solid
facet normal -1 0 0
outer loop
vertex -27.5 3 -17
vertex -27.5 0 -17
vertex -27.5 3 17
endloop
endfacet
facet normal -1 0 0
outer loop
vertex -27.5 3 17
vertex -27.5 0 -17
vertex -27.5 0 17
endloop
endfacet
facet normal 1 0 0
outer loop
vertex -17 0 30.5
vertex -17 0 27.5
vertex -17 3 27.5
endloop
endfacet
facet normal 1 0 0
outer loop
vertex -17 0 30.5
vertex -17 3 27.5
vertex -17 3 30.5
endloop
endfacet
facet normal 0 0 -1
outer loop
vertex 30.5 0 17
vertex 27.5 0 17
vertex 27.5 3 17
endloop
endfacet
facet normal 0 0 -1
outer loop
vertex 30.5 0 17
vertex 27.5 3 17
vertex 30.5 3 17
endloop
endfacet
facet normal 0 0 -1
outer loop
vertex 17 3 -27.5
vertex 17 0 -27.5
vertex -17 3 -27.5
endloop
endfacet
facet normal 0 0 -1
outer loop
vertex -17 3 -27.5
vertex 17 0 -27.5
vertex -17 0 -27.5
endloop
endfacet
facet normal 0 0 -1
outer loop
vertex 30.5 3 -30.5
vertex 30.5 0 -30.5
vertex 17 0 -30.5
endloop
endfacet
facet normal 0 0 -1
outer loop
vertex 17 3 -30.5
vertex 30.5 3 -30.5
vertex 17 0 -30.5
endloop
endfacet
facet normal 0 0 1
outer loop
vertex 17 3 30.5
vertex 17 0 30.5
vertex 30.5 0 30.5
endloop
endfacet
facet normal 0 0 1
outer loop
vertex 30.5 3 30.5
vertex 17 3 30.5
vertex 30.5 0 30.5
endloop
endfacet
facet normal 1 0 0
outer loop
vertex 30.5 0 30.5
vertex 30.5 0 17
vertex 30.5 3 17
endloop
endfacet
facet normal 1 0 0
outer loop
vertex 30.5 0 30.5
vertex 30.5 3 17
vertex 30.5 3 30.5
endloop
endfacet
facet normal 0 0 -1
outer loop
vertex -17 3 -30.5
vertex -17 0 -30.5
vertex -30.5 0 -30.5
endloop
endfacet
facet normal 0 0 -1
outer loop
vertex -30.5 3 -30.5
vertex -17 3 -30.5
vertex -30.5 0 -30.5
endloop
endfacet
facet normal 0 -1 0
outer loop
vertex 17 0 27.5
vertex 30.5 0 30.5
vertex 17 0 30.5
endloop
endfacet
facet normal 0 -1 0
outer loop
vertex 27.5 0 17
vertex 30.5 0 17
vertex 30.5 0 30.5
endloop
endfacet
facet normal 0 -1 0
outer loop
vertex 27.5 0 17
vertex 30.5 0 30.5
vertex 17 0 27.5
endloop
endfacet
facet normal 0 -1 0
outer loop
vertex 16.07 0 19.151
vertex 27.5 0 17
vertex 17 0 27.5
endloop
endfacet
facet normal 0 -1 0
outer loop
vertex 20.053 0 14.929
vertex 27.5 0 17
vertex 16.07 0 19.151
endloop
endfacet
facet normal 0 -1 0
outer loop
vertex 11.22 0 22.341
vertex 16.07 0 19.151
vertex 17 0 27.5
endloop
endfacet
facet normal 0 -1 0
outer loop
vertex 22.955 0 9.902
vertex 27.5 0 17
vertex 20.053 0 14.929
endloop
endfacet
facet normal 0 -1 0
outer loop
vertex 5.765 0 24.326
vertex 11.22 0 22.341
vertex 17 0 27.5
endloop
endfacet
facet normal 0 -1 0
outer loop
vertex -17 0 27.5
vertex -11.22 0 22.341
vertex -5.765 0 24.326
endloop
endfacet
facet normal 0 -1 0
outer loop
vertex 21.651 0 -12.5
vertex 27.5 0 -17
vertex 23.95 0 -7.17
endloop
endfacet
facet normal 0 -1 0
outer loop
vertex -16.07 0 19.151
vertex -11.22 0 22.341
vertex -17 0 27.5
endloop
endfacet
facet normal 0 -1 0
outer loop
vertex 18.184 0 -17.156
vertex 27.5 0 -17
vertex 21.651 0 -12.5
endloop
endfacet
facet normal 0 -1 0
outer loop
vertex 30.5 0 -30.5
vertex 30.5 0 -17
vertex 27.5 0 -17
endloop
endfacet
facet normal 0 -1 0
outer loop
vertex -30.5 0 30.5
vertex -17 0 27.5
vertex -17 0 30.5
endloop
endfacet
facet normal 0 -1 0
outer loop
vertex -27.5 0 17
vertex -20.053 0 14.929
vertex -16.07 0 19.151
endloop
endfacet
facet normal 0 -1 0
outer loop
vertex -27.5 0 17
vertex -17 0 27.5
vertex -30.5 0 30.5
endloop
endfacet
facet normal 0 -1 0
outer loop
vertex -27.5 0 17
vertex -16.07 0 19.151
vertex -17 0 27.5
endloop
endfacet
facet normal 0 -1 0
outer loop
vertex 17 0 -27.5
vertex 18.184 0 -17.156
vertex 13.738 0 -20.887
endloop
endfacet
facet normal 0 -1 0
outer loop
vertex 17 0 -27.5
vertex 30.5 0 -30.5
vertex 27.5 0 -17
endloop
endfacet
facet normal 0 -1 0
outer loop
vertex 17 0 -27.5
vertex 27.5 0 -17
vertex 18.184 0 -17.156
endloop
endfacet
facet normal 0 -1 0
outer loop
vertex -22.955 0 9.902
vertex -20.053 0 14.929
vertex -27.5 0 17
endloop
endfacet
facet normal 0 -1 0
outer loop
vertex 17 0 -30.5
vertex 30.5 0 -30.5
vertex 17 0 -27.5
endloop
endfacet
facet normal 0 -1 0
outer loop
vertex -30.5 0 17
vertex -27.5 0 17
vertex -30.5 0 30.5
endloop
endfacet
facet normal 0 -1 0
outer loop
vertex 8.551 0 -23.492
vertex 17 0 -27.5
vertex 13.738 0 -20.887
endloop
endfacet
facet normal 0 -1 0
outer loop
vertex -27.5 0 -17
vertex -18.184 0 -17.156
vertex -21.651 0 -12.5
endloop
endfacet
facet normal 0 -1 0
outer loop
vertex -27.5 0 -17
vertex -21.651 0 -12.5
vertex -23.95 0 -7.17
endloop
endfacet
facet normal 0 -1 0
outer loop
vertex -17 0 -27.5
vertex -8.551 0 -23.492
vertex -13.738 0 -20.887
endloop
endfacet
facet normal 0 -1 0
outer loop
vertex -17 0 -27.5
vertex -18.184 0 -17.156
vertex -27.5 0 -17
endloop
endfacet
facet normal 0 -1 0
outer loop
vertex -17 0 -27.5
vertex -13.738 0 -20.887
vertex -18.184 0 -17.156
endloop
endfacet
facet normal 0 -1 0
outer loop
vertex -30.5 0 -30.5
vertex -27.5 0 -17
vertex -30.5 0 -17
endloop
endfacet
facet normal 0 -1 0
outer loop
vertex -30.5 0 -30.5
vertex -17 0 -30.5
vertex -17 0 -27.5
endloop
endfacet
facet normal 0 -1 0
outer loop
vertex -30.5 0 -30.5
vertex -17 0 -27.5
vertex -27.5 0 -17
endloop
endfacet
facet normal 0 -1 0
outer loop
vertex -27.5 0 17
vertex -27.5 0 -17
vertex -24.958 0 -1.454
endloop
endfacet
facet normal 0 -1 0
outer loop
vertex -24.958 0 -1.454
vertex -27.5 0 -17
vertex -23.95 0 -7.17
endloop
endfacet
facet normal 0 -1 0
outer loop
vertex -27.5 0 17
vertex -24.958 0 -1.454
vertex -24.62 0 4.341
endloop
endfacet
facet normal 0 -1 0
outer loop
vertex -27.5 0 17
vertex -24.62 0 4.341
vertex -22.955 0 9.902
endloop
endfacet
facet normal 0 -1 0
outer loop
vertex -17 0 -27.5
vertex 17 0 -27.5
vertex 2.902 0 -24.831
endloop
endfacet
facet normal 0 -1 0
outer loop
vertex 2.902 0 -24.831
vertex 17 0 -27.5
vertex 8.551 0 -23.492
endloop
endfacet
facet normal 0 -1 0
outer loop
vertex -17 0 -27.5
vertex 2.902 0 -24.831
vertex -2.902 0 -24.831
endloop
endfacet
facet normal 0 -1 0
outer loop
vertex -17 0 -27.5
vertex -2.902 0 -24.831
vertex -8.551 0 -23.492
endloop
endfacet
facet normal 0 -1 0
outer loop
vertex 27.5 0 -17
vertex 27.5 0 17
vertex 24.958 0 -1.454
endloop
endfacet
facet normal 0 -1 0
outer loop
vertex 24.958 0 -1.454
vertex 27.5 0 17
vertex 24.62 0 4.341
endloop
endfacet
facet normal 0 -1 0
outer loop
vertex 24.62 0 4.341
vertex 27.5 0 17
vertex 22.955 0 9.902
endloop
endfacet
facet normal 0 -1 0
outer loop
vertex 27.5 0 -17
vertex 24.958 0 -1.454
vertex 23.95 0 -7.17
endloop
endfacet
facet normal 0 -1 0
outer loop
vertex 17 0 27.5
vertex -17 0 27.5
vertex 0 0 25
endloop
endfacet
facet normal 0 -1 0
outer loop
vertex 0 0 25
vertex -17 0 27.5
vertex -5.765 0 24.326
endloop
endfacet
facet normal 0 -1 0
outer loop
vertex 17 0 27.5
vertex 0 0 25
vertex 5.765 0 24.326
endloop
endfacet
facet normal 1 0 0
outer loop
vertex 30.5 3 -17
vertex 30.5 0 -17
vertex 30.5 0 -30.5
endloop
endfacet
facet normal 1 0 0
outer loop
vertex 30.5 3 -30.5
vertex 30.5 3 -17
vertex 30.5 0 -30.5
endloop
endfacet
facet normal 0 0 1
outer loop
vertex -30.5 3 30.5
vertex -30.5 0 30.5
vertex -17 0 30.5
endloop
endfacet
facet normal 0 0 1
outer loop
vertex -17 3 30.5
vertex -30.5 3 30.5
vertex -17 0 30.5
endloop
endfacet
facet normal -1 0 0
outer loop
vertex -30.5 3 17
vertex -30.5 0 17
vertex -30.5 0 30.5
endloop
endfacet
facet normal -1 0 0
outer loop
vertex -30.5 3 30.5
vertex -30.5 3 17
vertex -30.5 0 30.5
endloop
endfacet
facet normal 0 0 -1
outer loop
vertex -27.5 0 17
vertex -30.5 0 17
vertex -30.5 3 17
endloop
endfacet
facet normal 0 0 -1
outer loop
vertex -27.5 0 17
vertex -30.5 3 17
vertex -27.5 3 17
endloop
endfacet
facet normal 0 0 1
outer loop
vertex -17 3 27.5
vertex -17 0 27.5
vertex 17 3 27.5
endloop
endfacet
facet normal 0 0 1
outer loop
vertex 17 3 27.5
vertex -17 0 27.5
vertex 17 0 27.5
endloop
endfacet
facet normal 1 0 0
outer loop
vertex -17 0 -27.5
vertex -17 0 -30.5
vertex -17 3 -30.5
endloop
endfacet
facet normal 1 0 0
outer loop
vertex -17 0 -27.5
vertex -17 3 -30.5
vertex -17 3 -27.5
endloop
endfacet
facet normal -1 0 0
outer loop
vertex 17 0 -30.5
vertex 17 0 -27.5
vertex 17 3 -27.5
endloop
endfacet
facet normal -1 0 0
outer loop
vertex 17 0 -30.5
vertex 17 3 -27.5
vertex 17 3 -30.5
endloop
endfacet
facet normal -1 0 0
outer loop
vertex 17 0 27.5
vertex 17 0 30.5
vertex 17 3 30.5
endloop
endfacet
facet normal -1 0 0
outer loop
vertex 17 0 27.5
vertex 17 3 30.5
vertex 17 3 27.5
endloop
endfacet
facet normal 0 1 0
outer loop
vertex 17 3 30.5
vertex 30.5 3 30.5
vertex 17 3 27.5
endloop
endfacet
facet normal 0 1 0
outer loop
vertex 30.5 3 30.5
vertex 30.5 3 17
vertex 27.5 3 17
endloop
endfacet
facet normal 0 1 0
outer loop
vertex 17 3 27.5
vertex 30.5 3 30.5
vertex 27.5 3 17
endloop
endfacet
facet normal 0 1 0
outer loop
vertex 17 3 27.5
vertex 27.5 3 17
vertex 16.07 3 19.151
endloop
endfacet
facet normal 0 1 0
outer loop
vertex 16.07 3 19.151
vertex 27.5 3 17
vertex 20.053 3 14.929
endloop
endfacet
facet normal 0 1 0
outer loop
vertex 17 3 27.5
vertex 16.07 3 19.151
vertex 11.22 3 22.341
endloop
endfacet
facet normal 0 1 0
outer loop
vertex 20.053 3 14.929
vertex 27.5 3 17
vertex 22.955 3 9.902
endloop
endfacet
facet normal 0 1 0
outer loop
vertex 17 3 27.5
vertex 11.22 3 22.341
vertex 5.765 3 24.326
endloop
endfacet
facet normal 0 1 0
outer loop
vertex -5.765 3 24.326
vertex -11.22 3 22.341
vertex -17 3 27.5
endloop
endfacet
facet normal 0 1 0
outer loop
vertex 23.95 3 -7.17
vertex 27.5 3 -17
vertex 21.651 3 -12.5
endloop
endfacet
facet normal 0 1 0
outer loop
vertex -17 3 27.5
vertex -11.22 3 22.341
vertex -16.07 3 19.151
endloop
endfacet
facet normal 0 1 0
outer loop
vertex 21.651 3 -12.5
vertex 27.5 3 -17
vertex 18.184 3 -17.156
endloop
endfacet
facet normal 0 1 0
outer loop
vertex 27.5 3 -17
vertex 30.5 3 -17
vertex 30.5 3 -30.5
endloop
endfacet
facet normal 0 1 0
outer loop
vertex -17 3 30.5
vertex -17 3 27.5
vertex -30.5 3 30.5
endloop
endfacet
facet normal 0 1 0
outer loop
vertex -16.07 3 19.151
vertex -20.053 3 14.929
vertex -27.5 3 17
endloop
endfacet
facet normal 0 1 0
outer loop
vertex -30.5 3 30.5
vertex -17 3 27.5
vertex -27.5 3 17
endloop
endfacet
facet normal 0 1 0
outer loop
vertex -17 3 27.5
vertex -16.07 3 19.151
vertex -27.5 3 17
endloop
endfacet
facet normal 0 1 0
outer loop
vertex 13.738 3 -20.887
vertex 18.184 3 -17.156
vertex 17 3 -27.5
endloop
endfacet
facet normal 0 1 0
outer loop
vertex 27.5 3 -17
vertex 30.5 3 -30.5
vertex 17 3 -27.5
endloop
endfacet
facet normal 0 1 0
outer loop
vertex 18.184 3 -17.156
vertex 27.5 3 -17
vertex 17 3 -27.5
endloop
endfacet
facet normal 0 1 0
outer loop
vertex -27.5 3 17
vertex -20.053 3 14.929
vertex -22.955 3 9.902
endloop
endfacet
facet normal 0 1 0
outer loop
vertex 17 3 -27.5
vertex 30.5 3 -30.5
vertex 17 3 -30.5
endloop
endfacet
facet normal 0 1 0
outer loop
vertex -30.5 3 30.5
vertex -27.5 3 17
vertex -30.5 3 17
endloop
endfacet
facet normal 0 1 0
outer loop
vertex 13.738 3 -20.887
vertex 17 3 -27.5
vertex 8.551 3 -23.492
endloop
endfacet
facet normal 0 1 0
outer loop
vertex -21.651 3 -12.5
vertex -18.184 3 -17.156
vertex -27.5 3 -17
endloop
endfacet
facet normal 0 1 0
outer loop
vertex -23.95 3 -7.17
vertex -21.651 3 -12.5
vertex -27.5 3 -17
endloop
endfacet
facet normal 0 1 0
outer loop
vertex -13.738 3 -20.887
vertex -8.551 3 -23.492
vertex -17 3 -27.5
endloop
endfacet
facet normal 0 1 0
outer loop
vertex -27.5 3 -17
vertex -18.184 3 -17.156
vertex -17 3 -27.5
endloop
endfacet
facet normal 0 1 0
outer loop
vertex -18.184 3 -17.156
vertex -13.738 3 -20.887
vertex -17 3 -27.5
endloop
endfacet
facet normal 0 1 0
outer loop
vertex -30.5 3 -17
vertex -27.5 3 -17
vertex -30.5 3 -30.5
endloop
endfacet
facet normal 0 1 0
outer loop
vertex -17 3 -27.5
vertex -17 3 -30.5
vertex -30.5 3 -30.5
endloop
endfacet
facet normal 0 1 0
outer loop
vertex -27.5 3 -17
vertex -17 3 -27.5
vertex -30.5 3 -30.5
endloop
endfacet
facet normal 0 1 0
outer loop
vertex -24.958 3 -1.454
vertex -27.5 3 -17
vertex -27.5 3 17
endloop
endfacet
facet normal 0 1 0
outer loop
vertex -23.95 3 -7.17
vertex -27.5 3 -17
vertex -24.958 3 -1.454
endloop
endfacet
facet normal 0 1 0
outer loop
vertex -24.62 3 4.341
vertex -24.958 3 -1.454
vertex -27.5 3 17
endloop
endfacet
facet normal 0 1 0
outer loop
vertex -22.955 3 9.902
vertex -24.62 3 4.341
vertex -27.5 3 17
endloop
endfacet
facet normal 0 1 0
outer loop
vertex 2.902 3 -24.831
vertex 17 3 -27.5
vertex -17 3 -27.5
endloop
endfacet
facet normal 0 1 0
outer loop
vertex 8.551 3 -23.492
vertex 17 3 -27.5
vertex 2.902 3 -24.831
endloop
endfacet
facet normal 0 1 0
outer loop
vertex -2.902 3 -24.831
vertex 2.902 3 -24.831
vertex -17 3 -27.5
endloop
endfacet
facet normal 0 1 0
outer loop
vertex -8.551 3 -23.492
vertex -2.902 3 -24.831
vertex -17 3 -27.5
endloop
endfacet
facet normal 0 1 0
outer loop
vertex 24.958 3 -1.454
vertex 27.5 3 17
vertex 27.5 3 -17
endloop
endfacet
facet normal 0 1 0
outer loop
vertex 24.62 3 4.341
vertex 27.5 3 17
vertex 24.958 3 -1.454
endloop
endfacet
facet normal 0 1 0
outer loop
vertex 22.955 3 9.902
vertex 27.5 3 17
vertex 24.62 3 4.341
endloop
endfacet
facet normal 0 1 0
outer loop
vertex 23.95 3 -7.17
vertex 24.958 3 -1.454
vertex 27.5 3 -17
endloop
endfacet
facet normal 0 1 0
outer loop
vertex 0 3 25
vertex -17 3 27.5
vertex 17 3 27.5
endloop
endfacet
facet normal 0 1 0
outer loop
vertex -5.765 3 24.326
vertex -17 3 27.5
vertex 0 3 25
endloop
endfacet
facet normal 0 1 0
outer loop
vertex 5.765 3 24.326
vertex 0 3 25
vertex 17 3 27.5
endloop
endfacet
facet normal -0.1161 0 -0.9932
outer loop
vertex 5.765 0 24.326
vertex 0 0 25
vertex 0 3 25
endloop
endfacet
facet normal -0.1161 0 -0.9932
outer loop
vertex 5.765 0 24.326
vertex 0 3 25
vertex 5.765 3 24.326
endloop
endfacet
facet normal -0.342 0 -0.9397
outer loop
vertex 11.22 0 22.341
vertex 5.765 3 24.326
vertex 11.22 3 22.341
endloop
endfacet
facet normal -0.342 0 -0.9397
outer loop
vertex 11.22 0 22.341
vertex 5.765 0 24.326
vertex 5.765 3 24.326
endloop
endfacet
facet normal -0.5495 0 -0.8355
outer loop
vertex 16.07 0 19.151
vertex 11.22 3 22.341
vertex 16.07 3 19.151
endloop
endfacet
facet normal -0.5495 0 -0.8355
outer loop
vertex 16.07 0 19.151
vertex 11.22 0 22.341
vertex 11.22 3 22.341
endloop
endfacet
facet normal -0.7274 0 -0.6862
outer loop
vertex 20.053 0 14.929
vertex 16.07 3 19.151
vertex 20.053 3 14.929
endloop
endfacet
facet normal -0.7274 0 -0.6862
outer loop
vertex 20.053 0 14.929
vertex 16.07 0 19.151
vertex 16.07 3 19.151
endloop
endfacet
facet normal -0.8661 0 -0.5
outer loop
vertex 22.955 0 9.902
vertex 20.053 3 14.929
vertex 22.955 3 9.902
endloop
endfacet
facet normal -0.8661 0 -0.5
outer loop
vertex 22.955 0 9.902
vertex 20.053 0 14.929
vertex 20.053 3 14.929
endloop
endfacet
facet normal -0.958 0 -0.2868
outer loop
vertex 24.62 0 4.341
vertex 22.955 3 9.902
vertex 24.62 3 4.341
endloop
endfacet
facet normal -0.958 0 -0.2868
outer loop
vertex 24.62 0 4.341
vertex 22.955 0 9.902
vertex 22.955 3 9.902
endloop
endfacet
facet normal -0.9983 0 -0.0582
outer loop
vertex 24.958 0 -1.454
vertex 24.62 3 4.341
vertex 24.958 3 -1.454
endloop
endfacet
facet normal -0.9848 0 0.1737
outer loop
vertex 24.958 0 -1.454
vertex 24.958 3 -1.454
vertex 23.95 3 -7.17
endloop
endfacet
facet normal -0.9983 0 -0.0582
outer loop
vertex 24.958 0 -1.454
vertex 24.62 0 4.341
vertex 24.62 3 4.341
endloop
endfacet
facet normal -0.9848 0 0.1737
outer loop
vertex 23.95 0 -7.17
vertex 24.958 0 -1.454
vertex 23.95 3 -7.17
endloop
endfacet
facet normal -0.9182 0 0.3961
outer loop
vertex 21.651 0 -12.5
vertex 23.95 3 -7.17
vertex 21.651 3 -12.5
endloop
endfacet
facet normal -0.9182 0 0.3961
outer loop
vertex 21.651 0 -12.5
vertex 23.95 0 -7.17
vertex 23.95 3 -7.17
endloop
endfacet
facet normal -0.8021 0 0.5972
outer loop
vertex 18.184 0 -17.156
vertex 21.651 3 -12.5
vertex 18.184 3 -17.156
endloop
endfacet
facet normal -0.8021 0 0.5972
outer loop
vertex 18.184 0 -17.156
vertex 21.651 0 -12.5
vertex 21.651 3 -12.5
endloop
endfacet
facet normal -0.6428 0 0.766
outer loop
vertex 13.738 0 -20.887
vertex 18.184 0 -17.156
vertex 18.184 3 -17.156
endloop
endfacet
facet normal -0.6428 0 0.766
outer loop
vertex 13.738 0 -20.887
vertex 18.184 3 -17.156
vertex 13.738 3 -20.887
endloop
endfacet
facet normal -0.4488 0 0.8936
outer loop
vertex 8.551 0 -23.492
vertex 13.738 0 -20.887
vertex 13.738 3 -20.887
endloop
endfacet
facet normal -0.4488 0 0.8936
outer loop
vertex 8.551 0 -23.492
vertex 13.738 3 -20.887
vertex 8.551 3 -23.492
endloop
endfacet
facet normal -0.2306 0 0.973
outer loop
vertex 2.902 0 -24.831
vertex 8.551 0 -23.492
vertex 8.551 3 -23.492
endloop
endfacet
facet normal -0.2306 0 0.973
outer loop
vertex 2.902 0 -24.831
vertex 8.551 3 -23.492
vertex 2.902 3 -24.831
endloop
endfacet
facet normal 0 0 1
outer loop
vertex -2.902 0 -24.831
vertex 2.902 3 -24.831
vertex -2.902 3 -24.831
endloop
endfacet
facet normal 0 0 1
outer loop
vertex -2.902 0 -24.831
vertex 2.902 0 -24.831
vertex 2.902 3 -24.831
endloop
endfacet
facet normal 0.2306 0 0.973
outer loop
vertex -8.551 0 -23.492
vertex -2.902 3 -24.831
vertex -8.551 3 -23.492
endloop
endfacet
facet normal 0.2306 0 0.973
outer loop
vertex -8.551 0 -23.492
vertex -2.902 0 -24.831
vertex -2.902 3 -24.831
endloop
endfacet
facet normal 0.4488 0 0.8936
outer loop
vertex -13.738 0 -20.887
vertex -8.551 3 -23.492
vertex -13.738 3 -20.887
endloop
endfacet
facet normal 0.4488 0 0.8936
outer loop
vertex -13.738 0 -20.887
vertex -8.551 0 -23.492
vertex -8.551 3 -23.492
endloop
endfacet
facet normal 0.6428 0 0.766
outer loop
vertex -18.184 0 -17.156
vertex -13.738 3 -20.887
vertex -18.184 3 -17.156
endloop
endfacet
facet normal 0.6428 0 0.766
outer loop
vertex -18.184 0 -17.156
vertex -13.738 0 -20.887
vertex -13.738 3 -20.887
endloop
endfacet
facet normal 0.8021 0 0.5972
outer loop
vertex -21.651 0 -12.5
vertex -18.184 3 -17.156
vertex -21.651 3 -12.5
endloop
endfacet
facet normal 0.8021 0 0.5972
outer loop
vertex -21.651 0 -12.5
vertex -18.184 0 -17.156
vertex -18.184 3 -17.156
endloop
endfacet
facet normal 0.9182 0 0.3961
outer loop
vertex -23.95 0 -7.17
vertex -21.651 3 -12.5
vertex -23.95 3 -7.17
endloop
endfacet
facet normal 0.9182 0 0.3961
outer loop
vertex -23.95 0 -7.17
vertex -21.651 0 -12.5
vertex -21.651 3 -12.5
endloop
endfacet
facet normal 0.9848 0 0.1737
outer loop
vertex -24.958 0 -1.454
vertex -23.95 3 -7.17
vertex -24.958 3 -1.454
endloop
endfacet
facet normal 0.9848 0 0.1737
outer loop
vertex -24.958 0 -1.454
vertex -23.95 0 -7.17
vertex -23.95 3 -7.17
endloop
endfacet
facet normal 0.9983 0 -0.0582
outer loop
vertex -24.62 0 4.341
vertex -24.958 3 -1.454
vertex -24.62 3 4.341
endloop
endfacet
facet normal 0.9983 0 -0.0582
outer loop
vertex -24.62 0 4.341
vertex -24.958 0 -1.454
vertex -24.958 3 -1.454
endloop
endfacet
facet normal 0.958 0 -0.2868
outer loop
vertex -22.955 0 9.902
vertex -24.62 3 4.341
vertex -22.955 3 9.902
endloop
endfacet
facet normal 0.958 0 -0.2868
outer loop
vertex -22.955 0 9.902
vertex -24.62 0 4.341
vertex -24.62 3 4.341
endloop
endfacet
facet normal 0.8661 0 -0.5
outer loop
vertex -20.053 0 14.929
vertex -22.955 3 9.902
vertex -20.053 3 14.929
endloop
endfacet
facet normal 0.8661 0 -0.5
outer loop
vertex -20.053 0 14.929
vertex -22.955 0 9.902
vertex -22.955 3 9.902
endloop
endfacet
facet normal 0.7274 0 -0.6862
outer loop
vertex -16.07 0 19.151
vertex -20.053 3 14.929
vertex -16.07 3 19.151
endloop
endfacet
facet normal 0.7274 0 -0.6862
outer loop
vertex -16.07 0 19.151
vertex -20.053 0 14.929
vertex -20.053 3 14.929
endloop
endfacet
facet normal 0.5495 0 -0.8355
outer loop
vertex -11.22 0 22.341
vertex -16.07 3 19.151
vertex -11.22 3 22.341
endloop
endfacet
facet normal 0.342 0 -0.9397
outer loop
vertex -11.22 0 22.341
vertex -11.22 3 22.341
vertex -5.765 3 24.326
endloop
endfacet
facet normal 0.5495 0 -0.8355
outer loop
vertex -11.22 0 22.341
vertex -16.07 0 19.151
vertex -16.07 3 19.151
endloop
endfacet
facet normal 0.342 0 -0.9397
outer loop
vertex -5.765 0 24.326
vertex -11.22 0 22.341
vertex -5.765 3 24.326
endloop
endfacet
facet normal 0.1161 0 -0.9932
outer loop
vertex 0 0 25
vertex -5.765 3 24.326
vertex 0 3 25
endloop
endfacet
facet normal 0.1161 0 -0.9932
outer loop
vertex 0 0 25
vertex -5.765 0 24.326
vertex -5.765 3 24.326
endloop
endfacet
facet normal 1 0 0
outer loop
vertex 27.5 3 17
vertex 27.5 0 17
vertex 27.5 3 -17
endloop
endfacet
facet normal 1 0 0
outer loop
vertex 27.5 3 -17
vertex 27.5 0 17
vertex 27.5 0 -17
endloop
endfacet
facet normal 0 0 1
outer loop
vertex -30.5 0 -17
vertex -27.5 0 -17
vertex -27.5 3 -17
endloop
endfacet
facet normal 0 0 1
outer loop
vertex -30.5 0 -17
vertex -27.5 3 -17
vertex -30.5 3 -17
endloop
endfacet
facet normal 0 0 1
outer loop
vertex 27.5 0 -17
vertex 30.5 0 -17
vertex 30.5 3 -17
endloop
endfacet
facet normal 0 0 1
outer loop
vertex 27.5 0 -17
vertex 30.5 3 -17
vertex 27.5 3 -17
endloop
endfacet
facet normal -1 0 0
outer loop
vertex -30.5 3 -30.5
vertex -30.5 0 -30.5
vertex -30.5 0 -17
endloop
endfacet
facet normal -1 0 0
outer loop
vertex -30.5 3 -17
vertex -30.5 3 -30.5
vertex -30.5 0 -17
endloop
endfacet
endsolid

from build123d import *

# Parameters (mm, degrees)
CROQUIS1_R              = 25
SALIENTE_EXTRUIR1_DEPTH = 3


with BuildPart() as part:
    # Croquis1 → Saliente-Extruir1 (new body)
    with BuildSketch(Plane(origin=(0, 0, 0), x_dir=(1, 0, 0), z_dir=(0, 1, 0))):
        Polygon((-27.5, 0), (-27.5, 17), (-30.5, 17), (-30.5, 23.75), (-30.5, 30.5), (-23.75, 30.5), (-17, 30.5), (-17, 27.5), (0, 27.5), (17, 27.5), (17, 30.5), (23.75, 30.5), (30.5, 30.5), (30.5, 23.75), (30.5, 17), (27.5, 17), (27.5, 0), (27.5, -17), (30.5, -17), (30.5, -30.5), (23.75, -30.5), (17, -30.5), (17, -27.5), (0, -27.5), (-17, -27.5), (-17, -30.5), (-23.75, -30.5), (-30.5, -30.5), (-30.5, -23.75), (-30.5, -17), (-27.5, -17), align=None)
        with Locations(Location((0, 0, 0), (0, 0, 270))):
            Circle(CROQUIS1_R, mode=Mode.SUBTRACT)
    extrude(amount=SALIENTE_EXTRUIR1_DEPTH)


solid = part.part
